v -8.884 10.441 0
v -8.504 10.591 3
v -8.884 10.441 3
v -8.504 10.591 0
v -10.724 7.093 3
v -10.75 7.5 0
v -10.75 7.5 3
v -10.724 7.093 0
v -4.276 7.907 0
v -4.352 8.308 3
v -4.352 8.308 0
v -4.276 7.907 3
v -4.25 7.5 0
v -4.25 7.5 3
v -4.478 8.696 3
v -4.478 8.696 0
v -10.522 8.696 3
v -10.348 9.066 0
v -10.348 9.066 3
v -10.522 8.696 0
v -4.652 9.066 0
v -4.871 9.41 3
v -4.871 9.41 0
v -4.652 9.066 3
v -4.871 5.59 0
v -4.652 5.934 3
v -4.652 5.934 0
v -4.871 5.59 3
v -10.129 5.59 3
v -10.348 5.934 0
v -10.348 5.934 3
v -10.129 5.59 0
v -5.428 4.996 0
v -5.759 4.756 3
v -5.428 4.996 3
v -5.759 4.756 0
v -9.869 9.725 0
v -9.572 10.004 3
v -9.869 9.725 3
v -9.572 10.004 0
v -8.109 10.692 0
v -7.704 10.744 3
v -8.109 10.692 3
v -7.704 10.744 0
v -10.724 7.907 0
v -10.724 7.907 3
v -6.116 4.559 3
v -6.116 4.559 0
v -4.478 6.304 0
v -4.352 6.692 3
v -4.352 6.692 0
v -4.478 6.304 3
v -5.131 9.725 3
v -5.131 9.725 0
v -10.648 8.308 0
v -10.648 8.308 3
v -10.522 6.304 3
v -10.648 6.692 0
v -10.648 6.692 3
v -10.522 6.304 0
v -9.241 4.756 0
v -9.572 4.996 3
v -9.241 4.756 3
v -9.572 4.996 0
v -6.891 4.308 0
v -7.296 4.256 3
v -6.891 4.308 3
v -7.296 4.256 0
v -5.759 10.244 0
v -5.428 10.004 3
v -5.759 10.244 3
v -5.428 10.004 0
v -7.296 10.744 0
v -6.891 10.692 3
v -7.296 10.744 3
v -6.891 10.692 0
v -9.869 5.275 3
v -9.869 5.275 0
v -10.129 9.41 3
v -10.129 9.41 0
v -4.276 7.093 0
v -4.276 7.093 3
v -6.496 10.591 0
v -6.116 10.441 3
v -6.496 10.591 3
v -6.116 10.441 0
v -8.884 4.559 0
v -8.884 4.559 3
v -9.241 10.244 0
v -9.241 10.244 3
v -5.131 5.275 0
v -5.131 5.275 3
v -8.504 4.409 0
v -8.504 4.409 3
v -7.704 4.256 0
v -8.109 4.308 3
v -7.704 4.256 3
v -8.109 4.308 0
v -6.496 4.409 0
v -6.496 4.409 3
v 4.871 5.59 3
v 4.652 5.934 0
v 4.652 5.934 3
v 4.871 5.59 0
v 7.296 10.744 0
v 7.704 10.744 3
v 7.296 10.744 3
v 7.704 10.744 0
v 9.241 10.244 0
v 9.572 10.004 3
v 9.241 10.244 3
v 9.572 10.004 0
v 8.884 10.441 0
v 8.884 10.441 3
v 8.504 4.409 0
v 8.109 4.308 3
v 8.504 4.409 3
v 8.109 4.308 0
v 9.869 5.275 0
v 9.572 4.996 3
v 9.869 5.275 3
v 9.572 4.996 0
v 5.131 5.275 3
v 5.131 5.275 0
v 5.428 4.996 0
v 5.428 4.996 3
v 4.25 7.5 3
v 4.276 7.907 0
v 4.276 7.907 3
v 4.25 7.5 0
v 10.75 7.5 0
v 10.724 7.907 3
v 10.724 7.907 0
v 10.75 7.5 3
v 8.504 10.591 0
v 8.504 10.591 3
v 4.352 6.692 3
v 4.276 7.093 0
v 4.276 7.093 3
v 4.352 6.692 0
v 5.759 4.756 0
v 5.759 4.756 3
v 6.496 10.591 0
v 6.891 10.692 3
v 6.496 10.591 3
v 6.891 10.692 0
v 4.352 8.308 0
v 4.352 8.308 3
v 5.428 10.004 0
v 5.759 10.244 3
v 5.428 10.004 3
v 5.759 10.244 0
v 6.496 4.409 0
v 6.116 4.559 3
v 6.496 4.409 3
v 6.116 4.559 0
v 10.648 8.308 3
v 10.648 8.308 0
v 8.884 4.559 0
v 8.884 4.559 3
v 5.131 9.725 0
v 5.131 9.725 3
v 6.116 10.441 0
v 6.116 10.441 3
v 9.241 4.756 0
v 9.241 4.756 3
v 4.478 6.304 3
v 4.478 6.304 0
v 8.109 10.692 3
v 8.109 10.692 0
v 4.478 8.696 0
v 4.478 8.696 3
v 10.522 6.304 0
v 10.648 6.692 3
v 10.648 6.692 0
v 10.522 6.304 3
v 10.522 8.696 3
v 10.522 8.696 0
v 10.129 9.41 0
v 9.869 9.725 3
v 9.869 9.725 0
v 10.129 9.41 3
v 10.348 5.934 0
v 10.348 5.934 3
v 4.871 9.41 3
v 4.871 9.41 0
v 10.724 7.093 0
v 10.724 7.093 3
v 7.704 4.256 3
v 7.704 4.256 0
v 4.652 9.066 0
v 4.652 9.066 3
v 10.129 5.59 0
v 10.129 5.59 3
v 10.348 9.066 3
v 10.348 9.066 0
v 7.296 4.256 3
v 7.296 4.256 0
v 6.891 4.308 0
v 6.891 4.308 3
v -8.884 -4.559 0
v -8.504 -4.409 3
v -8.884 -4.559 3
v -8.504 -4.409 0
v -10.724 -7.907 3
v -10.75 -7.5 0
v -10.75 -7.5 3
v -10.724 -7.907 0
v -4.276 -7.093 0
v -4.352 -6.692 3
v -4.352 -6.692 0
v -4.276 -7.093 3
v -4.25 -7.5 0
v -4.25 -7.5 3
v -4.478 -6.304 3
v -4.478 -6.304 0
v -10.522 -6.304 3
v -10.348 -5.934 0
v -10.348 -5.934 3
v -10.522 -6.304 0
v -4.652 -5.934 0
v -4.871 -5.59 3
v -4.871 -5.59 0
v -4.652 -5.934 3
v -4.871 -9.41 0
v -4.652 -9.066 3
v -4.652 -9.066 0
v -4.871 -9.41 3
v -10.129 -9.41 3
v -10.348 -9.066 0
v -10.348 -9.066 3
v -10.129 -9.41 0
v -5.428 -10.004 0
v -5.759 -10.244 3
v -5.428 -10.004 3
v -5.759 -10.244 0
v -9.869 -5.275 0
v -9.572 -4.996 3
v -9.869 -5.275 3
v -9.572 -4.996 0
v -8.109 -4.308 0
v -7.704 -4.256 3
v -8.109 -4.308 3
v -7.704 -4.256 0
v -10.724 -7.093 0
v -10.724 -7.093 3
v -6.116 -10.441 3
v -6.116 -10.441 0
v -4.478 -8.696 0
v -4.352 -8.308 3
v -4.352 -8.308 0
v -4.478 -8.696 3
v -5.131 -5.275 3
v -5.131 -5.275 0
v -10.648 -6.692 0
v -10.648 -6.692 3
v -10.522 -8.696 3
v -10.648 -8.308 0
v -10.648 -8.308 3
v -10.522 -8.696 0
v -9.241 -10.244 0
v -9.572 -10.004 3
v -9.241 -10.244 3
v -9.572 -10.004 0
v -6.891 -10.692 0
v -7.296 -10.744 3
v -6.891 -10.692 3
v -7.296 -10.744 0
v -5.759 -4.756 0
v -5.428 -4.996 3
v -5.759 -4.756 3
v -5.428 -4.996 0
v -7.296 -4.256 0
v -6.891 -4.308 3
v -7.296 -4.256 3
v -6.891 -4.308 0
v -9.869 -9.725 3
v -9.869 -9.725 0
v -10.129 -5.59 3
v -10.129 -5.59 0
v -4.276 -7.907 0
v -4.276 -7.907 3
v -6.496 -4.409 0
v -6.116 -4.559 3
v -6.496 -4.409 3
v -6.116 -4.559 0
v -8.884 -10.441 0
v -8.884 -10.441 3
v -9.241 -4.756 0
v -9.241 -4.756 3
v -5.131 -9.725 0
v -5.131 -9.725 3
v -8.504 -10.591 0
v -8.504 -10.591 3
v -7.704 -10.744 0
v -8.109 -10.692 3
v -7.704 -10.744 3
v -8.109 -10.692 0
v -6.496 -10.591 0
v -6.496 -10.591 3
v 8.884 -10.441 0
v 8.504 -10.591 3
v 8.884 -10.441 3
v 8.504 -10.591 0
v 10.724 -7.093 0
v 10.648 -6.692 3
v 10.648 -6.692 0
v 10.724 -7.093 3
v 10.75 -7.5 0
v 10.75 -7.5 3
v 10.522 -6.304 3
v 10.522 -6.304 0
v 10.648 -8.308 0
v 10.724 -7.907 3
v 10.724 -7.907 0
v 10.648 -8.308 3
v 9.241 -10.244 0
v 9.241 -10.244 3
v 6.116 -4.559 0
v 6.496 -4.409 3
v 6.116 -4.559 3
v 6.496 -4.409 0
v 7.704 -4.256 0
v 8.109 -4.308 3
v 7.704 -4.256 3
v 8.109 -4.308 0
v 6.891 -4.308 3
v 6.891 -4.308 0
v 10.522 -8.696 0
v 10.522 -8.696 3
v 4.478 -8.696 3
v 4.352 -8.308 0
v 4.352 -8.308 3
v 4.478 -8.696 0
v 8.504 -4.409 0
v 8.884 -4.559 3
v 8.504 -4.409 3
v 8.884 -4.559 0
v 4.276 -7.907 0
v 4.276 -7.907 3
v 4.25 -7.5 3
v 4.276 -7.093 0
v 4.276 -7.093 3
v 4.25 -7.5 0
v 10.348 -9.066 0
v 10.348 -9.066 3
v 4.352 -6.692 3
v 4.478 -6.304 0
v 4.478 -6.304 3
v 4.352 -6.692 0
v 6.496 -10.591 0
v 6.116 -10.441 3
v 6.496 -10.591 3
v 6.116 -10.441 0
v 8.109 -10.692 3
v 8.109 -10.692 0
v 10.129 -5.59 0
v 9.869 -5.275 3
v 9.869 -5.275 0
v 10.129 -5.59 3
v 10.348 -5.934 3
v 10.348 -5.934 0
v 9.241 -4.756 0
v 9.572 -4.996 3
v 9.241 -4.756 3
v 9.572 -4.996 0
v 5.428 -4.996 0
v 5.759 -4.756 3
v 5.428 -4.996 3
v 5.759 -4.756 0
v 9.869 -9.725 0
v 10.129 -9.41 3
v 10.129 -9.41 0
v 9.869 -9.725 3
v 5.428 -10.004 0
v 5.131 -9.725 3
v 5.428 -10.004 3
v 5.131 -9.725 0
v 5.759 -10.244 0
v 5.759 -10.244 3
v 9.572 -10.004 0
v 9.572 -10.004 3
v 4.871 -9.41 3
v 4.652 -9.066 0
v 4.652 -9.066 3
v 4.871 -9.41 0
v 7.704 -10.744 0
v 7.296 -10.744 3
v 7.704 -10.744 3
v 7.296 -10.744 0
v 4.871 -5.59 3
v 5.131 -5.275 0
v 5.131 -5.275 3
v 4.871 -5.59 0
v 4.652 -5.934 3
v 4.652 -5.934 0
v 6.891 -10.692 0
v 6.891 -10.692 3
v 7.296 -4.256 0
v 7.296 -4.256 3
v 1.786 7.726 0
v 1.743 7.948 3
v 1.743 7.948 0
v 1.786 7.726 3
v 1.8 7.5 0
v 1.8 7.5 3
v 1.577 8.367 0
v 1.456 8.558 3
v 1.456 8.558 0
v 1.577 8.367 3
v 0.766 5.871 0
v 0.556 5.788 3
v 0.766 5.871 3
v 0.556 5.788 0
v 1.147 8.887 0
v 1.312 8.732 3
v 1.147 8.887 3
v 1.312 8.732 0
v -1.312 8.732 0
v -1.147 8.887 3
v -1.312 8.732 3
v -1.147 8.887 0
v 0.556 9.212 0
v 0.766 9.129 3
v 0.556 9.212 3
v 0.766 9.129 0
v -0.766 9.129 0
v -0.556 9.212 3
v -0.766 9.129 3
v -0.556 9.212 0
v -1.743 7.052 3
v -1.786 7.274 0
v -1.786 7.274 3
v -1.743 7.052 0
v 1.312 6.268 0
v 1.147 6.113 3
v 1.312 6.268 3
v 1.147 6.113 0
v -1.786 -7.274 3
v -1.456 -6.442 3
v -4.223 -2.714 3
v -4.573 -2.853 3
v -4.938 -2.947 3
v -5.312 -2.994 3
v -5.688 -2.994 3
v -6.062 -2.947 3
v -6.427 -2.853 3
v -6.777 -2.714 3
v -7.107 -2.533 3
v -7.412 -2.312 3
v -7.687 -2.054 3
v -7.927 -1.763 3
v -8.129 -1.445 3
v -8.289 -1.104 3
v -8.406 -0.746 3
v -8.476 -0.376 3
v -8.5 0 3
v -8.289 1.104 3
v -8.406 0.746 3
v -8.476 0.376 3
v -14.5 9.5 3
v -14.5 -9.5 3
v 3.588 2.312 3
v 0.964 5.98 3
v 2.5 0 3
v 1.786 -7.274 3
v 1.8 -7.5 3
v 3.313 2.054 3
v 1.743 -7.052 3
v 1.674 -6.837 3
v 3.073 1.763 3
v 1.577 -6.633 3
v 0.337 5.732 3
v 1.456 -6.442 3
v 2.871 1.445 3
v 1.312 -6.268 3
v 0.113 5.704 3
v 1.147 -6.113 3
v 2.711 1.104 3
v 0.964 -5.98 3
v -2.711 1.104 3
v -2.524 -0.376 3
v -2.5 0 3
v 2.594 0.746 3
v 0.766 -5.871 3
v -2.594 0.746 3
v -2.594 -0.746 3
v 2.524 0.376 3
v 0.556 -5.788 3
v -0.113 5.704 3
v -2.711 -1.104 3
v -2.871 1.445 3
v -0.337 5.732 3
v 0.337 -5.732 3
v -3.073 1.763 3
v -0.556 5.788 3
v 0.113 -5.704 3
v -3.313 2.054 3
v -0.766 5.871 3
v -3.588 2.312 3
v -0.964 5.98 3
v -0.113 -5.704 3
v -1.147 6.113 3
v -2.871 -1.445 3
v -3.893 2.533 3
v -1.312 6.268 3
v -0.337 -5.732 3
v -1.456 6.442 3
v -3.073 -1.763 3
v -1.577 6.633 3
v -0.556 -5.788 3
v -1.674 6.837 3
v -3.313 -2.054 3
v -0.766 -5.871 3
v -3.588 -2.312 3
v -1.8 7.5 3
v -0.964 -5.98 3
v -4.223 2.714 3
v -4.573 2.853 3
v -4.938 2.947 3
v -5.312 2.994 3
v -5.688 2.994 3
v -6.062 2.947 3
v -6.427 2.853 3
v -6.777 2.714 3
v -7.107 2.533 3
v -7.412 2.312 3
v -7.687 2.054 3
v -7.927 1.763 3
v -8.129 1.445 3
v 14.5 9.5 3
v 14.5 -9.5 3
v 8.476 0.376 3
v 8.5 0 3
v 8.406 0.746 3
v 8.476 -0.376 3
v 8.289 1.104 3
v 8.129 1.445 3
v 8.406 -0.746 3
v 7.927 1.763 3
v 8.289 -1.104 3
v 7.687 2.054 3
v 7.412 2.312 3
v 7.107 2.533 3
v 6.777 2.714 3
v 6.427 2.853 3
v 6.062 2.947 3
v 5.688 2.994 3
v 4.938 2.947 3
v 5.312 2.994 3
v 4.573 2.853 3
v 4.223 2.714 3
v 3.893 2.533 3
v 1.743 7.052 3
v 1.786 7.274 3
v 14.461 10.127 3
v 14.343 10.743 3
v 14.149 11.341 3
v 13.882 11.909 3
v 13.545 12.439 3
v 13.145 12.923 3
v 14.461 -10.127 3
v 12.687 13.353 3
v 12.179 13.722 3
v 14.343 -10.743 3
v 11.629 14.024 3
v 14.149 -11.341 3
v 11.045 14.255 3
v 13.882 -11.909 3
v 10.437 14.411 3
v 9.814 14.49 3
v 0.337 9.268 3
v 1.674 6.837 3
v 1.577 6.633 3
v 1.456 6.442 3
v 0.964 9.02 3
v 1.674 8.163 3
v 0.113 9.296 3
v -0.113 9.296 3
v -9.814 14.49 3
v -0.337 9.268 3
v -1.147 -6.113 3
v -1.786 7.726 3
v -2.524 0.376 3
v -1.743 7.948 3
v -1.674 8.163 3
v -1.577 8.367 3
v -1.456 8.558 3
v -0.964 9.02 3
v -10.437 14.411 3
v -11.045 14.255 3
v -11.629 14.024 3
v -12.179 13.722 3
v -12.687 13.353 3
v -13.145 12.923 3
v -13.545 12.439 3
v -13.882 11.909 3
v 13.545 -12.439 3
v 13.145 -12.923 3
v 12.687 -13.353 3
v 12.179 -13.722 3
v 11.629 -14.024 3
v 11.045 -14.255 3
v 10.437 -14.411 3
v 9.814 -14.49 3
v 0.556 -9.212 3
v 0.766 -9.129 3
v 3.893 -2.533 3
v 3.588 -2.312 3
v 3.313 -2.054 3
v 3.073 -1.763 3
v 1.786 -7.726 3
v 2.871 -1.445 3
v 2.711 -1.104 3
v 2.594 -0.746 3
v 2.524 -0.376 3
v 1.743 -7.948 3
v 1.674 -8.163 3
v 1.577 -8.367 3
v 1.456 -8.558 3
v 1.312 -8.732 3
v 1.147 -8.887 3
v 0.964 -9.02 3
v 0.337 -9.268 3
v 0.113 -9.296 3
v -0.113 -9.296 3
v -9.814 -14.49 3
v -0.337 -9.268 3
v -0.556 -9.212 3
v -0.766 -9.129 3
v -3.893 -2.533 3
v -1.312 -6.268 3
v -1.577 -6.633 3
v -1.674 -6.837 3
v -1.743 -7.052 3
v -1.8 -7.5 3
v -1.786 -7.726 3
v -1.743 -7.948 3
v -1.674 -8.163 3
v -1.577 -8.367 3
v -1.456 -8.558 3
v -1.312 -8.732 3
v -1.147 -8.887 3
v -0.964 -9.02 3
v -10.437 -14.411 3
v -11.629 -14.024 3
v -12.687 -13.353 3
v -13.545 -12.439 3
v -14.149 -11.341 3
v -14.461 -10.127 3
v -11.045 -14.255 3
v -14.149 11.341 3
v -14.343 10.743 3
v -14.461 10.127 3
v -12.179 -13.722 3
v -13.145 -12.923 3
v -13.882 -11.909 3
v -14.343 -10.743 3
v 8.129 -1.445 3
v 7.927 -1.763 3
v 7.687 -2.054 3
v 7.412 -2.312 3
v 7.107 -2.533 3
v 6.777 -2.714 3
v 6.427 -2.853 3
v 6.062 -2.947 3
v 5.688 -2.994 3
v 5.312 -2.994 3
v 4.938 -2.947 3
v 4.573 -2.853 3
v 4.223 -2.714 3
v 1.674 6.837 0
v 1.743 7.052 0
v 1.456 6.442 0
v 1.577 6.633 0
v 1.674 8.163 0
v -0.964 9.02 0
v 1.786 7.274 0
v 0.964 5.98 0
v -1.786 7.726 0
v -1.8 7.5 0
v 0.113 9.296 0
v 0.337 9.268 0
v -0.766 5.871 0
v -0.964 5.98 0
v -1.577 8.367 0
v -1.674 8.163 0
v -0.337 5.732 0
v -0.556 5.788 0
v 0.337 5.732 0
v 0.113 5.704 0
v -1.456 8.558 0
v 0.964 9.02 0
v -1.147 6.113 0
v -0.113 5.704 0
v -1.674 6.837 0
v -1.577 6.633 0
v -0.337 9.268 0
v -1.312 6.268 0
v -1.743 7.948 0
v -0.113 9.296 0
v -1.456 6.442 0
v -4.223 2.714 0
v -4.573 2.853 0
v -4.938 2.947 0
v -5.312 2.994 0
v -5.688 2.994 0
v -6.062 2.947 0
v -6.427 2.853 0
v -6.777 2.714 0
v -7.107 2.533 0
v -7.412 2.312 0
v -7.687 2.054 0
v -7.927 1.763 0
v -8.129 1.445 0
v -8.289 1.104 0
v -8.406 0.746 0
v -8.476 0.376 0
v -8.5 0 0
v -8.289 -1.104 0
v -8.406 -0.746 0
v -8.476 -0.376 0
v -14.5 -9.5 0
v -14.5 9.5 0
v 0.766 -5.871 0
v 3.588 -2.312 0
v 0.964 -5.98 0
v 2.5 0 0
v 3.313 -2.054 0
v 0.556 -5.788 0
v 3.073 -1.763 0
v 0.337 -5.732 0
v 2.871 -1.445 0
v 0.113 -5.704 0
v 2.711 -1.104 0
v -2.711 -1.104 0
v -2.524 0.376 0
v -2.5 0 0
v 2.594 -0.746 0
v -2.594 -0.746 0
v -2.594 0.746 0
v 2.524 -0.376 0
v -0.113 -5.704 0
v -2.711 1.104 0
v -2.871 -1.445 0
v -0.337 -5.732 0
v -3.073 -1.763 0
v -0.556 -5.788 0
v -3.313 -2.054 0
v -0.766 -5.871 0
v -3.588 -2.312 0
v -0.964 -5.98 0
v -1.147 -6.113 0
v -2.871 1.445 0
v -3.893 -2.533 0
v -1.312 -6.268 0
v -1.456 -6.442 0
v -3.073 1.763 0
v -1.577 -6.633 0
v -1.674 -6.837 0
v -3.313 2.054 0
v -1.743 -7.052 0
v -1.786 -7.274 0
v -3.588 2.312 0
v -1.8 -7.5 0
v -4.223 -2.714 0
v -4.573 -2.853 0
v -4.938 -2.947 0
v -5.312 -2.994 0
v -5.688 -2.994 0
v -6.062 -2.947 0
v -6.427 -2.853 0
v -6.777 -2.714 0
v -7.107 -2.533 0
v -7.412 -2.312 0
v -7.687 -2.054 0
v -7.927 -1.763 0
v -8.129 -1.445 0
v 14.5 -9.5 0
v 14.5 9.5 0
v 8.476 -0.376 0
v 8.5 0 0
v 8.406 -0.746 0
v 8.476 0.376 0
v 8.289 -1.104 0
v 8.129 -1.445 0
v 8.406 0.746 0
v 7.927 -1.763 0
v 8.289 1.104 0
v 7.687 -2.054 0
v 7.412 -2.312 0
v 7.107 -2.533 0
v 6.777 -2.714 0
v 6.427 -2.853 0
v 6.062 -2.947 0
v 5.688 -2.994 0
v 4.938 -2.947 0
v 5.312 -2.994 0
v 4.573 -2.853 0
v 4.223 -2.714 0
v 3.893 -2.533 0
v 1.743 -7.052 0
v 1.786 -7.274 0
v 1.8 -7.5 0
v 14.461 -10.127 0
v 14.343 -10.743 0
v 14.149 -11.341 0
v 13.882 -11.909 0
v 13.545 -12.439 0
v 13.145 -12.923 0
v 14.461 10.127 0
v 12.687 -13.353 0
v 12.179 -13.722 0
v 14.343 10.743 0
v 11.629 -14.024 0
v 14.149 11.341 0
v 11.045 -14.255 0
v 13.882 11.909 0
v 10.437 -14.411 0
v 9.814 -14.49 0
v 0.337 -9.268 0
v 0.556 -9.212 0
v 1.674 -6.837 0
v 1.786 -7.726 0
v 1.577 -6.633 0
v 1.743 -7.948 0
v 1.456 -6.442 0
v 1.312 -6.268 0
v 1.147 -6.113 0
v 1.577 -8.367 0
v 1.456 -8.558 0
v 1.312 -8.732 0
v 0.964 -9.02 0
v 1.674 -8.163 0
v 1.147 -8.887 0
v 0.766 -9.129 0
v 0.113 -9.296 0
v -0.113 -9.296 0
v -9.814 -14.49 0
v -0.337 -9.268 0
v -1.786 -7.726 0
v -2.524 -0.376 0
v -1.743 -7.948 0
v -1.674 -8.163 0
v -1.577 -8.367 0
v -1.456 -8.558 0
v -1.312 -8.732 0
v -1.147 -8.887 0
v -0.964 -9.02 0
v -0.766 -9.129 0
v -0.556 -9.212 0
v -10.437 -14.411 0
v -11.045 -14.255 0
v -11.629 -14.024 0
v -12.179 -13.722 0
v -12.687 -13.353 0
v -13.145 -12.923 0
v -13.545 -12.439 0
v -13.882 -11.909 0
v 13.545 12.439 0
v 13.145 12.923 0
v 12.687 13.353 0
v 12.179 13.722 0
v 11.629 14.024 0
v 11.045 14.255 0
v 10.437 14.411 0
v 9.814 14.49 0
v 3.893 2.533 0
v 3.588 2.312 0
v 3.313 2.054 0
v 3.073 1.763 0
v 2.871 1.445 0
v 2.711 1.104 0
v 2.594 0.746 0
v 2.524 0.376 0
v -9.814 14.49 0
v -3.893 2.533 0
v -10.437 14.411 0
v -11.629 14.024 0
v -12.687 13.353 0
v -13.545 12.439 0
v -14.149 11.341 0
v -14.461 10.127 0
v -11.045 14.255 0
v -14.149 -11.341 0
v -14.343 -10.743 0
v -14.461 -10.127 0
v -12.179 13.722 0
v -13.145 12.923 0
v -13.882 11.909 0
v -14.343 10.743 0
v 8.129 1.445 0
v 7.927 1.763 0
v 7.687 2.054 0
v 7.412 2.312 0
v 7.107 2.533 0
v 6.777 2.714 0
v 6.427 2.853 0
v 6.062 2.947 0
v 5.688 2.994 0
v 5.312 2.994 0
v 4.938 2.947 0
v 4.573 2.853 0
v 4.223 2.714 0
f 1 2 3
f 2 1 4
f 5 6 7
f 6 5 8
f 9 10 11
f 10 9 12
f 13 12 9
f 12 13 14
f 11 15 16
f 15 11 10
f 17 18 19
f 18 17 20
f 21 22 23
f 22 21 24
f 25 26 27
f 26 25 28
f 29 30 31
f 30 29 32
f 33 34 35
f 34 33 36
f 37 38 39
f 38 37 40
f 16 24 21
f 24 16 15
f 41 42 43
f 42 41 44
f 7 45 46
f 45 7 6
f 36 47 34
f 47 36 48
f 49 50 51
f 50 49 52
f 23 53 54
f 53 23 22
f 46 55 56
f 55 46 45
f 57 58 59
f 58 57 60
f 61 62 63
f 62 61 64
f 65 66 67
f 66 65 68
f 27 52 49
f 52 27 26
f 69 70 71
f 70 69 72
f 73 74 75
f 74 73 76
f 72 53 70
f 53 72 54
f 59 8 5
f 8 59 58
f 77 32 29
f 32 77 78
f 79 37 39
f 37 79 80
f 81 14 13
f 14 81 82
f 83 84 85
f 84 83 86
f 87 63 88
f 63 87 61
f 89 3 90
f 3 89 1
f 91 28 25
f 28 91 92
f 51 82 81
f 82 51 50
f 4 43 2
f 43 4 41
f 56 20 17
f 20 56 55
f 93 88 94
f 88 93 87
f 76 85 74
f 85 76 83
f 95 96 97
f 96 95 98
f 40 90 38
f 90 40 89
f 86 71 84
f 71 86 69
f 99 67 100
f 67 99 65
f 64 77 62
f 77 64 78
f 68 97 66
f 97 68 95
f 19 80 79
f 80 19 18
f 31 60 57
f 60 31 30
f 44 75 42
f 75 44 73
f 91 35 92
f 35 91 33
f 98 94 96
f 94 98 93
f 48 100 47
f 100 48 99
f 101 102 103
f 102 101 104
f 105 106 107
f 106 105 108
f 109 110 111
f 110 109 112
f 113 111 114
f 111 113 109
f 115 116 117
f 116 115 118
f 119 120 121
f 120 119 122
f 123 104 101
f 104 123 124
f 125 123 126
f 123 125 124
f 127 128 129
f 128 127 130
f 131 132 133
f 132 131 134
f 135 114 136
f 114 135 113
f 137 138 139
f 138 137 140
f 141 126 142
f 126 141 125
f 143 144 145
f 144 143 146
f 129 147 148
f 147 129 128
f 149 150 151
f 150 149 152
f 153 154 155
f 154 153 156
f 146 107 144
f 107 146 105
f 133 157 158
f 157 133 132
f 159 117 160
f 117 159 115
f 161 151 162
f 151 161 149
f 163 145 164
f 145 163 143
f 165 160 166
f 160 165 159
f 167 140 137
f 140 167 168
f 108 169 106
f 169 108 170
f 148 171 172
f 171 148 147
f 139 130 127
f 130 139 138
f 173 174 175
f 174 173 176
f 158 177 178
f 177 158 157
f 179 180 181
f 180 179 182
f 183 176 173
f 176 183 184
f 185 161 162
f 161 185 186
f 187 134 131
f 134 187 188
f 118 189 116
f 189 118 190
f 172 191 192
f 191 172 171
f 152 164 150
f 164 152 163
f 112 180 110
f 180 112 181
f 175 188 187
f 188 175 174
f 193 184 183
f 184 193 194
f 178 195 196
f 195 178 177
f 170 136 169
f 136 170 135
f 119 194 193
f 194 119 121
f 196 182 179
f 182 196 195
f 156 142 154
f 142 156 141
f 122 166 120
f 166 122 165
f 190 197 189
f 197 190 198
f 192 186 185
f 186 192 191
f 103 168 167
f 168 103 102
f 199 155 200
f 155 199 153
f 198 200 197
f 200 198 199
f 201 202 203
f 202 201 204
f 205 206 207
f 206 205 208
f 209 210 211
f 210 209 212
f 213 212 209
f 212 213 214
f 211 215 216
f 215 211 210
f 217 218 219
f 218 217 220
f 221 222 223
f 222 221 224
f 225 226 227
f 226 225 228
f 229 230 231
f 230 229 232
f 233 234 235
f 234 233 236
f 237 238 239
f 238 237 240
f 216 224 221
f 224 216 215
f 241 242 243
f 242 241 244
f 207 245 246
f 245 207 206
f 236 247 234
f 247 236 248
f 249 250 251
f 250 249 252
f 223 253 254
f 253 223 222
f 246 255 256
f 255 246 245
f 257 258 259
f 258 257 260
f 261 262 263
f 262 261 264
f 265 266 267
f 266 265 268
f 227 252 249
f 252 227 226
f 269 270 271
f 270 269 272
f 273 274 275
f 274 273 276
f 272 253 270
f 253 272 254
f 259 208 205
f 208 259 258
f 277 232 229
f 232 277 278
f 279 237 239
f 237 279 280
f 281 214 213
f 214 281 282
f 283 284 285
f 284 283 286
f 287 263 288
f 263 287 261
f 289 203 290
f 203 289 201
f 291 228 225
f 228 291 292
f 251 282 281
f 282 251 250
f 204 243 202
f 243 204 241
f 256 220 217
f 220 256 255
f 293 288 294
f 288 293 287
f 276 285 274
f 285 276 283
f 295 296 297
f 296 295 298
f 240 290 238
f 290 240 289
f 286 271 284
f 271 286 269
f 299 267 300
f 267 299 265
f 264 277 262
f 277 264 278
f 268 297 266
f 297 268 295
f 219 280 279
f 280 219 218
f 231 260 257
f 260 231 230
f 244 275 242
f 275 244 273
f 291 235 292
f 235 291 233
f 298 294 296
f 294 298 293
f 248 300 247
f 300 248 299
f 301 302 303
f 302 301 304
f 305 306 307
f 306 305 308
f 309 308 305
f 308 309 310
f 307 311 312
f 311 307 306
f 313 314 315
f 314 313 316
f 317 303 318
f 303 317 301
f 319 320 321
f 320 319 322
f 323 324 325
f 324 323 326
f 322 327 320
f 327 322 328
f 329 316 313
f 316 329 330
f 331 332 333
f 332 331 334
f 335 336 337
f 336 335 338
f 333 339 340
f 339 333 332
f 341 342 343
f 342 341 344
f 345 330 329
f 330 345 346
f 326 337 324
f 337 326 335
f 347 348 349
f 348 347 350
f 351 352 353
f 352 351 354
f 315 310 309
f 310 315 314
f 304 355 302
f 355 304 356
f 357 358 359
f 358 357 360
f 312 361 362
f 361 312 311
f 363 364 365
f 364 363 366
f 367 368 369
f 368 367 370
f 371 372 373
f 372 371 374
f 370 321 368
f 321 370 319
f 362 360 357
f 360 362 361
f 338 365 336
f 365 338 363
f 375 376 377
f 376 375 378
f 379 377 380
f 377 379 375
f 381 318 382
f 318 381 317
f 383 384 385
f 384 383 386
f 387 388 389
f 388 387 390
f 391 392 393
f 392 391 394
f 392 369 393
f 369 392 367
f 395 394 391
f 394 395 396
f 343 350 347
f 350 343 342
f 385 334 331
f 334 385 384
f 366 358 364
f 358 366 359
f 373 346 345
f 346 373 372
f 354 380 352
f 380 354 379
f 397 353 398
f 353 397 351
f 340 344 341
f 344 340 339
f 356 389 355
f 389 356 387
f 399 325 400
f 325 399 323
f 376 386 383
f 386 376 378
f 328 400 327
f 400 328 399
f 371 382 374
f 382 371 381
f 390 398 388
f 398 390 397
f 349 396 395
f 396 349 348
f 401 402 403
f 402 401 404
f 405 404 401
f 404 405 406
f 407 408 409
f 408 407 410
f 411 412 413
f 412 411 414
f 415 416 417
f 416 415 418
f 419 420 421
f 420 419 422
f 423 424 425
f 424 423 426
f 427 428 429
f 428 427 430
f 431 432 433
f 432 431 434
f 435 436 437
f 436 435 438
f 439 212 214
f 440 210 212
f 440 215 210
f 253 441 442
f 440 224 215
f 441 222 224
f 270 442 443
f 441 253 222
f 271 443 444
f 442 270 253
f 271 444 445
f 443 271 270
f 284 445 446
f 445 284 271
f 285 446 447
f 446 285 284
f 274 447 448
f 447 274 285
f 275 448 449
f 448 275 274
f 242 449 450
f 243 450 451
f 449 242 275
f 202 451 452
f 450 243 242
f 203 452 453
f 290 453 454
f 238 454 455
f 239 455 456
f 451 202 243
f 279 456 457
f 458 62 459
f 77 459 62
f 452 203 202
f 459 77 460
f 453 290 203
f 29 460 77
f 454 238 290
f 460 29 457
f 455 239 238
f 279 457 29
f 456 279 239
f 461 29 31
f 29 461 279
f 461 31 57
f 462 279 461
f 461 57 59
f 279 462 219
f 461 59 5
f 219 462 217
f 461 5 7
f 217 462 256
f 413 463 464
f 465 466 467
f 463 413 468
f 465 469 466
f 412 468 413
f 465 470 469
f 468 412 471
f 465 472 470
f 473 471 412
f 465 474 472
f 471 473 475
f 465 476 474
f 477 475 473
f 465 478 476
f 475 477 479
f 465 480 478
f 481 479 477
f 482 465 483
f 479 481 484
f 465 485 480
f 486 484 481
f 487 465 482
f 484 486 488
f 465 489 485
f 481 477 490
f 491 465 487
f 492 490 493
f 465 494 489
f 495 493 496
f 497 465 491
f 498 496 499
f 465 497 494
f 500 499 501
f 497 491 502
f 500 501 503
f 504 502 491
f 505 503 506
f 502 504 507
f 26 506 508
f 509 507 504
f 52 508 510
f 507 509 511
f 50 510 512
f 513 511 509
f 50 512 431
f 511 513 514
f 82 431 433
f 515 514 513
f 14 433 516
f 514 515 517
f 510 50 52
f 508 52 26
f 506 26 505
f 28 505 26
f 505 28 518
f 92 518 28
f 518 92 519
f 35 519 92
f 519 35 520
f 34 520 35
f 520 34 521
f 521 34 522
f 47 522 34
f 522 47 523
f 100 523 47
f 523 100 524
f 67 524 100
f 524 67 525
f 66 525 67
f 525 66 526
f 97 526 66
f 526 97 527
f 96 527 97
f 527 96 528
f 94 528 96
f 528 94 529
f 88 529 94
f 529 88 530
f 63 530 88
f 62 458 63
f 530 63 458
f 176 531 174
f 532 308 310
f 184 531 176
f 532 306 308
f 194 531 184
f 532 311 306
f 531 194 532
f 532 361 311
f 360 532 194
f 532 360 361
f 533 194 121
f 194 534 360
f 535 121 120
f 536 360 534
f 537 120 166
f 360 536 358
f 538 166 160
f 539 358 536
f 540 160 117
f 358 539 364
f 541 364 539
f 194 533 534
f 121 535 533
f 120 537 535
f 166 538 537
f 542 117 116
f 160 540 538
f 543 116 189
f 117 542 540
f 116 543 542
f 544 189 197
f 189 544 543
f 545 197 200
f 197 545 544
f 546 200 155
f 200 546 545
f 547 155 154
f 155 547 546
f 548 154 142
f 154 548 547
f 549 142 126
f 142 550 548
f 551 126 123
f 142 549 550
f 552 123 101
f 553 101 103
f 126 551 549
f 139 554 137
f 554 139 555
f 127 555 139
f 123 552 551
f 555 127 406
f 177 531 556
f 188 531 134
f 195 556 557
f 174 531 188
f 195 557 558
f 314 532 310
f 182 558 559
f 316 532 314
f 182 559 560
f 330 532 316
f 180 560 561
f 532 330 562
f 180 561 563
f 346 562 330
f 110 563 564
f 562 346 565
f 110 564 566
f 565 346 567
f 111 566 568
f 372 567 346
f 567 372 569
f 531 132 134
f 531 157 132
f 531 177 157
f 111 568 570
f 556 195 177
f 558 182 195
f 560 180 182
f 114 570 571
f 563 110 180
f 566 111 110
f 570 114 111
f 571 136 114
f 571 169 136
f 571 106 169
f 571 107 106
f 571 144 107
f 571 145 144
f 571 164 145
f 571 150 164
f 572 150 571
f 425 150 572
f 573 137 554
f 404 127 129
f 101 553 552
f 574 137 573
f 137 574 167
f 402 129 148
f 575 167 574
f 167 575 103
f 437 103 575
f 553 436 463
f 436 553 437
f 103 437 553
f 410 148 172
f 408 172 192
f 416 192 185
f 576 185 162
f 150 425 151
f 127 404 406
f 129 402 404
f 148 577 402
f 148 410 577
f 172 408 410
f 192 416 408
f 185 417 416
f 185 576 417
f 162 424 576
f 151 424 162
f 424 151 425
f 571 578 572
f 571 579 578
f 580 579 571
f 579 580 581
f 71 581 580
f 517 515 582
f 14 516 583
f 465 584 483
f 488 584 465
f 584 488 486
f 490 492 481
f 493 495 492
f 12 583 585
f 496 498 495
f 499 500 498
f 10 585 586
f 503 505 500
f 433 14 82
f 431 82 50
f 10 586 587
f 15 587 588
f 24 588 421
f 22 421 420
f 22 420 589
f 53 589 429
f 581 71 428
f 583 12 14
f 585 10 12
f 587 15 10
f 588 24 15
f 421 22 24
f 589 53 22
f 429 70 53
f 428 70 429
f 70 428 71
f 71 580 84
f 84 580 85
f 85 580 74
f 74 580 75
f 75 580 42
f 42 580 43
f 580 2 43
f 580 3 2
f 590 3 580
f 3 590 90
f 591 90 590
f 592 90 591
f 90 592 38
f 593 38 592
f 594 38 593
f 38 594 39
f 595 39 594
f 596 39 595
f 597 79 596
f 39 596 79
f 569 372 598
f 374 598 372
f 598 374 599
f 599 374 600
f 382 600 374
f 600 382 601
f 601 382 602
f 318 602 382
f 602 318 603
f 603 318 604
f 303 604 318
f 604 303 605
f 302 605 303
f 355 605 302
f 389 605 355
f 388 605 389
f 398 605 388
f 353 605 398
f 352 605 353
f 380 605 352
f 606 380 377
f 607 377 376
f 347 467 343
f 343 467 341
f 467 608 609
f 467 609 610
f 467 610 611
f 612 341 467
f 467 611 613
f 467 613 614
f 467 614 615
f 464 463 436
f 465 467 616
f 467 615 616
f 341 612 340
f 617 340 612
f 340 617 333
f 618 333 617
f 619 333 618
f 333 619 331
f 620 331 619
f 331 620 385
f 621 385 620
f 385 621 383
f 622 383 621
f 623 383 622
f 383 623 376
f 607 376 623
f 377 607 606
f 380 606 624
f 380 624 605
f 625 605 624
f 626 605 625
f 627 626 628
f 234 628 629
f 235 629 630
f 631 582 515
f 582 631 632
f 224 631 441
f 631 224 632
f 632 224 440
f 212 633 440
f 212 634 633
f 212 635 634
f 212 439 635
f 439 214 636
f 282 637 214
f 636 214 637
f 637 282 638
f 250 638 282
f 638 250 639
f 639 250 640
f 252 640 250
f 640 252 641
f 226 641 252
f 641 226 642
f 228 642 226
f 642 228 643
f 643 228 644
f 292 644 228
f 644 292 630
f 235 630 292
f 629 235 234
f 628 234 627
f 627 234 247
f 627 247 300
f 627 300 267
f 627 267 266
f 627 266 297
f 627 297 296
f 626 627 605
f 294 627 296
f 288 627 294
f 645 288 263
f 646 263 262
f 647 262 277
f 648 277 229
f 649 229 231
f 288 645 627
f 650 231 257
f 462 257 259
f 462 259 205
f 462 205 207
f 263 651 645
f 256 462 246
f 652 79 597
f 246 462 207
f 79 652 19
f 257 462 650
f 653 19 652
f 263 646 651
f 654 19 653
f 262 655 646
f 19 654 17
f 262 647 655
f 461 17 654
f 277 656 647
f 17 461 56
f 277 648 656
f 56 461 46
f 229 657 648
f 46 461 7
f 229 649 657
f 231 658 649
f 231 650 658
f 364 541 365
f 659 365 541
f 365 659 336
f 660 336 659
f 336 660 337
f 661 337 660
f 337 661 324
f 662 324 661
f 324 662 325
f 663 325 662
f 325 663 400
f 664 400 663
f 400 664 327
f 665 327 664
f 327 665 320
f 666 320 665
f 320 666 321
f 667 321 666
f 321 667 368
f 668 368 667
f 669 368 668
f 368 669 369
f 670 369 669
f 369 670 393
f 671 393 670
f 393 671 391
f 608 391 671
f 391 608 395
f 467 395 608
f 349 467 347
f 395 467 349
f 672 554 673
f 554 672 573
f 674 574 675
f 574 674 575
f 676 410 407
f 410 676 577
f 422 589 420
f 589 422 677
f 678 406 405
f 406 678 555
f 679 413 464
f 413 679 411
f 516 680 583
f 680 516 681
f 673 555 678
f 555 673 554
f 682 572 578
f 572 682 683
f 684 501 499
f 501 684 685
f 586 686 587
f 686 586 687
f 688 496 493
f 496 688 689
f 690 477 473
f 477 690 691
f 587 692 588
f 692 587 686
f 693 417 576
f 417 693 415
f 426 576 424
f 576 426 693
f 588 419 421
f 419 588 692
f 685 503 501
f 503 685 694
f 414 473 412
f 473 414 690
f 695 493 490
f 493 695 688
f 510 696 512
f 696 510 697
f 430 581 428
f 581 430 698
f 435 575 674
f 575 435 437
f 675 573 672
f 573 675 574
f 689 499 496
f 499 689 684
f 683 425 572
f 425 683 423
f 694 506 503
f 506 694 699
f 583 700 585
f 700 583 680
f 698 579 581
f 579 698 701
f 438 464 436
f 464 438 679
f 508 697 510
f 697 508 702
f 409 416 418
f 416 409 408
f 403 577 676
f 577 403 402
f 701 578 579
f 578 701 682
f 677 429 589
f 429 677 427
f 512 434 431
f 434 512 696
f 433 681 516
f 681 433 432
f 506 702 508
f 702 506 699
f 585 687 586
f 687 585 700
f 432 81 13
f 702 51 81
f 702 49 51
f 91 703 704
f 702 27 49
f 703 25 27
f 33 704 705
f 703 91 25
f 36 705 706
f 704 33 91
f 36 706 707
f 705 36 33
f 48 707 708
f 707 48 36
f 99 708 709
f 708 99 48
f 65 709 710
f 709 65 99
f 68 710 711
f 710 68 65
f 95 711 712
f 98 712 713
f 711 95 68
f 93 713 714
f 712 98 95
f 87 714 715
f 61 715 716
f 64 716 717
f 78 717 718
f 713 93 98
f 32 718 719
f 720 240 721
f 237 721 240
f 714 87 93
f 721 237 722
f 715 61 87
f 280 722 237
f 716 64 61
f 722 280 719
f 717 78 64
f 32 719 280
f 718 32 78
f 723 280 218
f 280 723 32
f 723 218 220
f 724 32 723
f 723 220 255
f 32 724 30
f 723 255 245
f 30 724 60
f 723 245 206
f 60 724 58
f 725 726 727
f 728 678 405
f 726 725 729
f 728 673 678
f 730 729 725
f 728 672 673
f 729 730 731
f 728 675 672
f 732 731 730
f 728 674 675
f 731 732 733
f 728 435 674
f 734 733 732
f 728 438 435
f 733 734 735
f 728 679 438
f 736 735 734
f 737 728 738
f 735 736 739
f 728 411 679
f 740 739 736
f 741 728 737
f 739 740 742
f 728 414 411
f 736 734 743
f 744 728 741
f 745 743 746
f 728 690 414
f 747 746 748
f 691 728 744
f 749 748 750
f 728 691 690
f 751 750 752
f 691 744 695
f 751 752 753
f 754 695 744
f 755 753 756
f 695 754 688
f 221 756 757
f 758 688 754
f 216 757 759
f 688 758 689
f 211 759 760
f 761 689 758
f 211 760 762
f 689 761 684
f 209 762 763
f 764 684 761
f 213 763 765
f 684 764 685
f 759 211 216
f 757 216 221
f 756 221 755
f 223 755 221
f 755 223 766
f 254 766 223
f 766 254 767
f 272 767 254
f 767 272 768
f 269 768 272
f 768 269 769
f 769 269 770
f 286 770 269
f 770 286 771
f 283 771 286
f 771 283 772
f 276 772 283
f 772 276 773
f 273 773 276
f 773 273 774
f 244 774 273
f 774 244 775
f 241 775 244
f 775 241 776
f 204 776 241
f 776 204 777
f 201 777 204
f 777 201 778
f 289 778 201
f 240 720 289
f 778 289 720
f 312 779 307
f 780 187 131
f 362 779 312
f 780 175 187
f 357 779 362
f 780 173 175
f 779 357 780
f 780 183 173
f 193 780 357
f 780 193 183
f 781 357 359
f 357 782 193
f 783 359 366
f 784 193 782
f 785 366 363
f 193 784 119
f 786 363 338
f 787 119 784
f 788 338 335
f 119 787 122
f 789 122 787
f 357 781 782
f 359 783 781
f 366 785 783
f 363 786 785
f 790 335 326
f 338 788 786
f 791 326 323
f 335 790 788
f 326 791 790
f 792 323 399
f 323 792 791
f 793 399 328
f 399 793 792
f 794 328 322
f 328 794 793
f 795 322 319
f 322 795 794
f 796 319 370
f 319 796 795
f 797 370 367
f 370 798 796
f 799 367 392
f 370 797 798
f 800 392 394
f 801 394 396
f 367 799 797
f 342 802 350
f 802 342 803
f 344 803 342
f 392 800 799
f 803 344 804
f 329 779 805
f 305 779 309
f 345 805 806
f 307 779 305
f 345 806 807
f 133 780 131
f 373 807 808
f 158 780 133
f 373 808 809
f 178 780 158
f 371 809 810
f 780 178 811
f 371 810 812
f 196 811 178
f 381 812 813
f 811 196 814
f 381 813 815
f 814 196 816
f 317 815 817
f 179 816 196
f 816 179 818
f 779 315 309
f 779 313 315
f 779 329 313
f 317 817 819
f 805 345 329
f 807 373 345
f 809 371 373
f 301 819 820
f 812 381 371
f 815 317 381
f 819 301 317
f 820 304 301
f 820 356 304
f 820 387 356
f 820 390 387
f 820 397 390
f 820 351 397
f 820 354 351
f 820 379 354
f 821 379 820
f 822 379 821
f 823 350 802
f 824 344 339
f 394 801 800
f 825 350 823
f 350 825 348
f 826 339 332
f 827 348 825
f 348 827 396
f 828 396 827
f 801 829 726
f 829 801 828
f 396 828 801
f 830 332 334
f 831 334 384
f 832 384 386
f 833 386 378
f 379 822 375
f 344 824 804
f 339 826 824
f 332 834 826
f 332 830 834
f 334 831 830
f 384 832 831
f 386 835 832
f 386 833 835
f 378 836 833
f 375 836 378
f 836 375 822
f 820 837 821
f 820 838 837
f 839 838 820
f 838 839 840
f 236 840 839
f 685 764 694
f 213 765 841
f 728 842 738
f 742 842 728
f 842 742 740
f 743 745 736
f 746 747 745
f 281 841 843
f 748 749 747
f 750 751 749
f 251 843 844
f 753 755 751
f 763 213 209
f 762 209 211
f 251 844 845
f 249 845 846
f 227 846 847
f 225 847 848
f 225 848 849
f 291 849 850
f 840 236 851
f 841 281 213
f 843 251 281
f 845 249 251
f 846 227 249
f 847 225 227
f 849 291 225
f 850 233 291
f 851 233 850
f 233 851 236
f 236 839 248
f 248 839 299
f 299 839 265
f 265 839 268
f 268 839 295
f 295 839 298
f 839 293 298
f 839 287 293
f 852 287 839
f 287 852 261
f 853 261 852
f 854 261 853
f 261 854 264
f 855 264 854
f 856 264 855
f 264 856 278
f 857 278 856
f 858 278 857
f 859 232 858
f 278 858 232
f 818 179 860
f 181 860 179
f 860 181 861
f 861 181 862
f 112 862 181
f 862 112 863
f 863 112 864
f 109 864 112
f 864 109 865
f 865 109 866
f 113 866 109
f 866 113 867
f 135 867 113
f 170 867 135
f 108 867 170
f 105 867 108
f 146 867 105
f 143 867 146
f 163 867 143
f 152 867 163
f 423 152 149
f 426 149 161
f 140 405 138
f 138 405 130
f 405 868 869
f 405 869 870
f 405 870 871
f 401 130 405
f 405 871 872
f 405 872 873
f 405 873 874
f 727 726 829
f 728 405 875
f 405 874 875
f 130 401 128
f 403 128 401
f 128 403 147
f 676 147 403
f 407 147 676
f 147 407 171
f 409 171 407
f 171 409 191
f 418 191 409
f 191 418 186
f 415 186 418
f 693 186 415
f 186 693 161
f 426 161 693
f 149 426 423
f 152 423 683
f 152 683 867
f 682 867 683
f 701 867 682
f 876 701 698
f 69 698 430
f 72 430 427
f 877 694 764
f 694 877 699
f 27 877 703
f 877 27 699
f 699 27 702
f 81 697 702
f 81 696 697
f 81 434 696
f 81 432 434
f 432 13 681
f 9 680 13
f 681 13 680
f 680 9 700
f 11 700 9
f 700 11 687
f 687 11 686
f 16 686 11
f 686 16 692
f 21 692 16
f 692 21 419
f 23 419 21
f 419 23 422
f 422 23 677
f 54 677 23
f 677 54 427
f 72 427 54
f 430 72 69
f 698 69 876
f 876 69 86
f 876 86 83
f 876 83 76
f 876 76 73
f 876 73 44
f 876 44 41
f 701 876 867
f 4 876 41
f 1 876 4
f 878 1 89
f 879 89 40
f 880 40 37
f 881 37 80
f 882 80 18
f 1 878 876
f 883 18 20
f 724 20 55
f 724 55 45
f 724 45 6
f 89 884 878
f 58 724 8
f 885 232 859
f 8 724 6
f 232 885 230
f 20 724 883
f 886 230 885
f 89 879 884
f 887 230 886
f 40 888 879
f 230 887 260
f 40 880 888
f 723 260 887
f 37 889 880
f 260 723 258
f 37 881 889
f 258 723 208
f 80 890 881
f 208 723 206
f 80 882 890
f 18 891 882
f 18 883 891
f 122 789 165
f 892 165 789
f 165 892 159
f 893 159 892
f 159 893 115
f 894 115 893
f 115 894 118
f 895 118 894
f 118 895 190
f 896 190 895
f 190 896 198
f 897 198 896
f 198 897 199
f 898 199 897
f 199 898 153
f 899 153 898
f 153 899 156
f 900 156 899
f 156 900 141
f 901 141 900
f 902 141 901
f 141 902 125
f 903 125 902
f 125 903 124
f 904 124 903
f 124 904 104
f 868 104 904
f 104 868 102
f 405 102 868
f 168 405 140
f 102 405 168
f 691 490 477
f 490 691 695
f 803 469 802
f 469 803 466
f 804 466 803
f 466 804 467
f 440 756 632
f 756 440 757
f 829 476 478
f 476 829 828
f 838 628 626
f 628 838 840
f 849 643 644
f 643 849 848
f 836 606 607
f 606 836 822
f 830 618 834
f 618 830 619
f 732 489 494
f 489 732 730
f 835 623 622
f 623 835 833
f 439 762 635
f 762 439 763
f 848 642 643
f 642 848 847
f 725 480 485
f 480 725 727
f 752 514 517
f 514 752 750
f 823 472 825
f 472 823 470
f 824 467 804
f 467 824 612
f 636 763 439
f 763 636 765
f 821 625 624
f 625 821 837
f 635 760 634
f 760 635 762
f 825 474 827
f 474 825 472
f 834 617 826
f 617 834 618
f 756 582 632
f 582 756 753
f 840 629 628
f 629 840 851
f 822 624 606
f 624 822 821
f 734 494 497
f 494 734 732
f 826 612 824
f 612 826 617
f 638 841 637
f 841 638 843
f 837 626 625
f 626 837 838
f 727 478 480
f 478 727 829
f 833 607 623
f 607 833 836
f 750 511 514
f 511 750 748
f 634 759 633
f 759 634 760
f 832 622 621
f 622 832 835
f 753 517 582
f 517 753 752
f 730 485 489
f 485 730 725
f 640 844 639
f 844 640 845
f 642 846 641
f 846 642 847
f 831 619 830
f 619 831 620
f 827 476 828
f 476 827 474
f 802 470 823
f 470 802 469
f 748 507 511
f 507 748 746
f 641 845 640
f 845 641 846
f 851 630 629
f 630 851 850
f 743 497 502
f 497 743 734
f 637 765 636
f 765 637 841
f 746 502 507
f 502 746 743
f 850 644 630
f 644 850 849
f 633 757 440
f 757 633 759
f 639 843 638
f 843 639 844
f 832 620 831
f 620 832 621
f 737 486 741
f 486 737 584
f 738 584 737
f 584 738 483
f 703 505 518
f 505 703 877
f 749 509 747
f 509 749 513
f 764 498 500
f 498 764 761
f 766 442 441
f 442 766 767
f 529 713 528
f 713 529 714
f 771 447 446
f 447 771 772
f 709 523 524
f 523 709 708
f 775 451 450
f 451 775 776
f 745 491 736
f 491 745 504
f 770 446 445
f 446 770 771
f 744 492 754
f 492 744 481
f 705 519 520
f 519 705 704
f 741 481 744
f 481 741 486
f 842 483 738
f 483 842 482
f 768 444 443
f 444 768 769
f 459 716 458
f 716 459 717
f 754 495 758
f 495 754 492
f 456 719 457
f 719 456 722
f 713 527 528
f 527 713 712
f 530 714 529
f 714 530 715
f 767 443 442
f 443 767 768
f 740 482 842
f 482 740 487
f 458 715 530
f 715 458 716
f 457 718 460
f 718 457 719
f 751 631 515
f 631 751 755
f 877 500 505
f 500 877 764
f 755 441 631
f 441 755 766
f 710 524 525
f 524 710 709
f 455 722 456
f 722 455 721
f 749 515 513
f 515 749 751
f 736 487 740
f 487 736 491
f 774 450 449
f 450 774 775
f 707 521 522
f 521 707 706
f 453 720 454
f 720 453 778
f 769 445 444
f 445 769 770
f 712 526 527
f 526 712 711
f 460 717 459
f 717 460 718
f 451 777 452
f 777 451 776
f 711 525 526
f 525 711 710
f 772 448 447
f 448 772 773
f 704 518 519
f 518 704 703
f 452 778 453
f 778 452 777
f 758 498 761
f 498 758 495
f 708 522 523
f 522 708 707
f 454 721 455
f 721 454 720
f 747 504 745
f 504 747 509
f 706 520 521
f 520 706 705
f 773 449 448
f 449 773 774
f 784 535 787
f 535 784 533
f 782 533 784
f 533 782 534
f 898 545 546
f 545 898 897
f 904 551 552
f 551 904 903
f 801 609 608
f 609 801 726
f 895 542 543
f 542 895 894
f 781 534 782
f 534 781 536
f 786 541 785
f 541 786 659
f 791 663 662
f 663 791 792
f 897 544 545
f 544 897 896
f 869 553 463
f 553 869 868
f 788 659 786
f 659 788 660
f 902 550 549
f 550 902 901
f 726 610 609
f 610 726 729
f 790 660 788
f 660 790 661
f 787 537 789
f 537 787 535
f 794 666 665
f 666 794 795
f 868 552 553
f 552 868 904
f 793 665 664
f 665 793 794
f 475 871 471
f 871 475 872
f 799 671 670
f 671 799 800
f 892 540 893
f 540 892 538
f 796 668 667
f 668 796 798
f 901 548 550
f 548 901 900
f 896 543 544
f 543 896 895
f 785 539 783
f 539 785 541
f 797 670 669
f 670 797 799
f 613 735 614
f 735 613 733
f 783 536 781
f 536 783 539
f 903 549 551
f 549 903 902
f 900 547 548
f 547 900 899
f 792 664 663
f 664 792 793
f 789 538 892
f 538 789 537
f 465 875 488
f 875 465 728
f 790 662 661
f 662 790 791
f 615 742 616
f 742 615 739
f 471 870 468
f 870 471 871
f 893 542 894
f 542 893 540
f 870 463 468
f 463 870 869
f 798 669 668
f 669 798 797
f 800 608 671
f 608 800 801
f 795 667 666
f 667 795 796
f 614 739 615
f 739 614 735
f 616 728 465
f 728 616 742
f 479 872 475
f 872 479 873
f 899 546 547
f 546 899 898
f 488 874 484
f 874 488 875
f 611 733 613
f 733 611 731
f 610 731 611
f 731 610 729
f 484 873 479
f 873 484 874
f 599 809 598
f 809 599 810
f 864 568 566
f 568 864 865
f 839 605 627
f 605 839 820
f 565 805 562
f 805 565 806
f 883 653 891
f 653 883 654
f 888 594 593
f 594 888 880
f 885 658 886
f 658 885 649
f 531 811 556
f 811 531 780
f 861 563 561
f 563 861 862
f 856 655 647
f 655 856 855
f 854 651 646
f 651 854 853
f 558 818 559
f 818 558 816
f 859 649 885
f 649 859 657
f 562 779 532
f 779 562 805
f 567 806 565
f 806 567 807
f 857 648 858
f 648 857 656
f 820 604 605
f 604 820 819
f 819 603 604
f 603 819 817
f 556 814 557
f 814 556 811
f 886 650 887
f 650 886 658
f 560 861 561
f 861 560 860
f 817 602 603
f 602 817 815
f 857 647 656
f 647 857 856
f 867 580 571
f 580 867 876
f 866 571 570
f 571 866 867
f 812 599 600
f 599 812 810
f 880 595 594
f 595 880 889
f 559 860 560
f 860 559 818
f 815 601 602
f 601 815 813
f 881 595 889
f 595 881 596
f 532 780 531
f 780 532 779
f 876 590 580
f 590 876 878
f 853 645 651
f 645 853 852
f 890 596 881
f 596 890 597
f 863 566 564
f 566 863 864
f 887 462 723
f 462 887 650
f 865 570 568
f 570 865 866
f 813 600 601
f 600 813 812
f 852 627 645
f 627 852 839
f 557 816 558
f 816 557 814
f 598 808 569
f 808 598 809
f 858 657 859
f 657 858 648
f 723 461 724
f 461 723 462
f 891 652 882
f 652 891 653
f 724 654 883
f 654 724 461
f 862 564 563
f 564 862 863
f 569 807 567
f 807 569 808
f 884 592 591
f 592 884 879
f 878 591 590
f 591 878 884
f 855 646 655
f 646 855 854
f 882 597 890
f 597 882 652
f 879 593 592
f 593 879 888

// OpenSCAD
$fn = 50;


difference() {
	union() {
		hull() {
			translate(v = [-9.5000000000, 9.5000000000, 0]) {
				cylinder(h = 3, r = 5);
			}
			translate(v = [9.5000000000, 9.5000000000, 0]) {
				cylinder(h = 3, r = 5);
			}
			translate(v = [-9.5000000000, -9.5000000000, 0]) {
				cylinder(h = 3, r = 5);
			}
			translate(v = [9.5000000000, -9.5000000000, 0]) {
				cylinder(h = 3, r = 5);
			}
		}
	}
	union() {
		#translate(v = [-7.5000000000, 7.5000000000, 0]) {
			cylinder(h = 3, r = 3.2500000000);
		}
		#translate(v = [7.5000000000, 7.5000000000, 0]) {
			cylinder(h = 3, r = 3.2500000000);
		}
		#translate(v = [-7.5000000000, -7.5000000000, 0]) {
			cylinder(h = 3, r = 3.2500000000);
		}
		#translate(v = [7.5000000000, -7.5000000000, 0]) {
			cylinder(h = 3, r = 3.2500000000);
		}
		#translate(v = [-7.5000000000, -7.5000000000, -100.0000000000]) {
			cylinder(h = 200, r = 3.2500000000);
		}
		#translate(v = [-7.5000000000, 7.5000000000, -100.0000000000]) {
			cylinder(h = 200, r = 3.2500000000);
		}
		#translate(v = [7.5000000000, -7.5000000000, -100.0000000000]) {
			cylinder(h = 200, r = 3.2500000000);
		}
		#translate(v = [7.5000000000, 7.5000000000, -100.0000000000]) {
			cylinder(h = 200, r = 3.2500000000);
		}
		#translate(v = [-7.5000000000, 7.5000000000, 0]) {
			cylinder(h = 3, r = 1.8000000000);
		}
		#translate(v = [0.0000000000, 7.5000000000, 0]) {
			cylinder(h = 3, r = 1.8000000000);
		}
		#translate(v = [7.5000000000, 7.5000000000, 0]) {
			cylinder(h = 3, r = 1.8000000000);
		}
		#translate(v = [-7.5000000000, -7.5000000000, 0]) {
			cylinder(h = 3, r = 1.8000000000);
		}
		#translate(v = [0.0000000000, -7.5000000000, 0]) {
			cylinder(h = 3, r = 1.8000000000);
		}
		#translate(v = [7.5000000000, -7.5000000000, 0]) {
			cylinder(h = 3, r = 1.8000000000);
		}
		#translate(v = [-7.5000000000, 7.5000000000, 0]) {
			cylinder(h = 3, r = 1.8000000000);
		}
		#translate(v = [0.0000000000, 7.5000000000, 0]) {
			cylinder(h = 3, r = 1.8000000000);
		}
		#translate(v = [7.5000000000, 7.5000000000, 0]) {
			cylinder(h = 3, r = 1.8000000000);
		}
		#translate(v = [-7.5000000000, -7.5000000000, 0]) {
			cylinder(h = 3, r = 1.8000000000);
		}
		#translate(v = [0.0000000000, -7.5000000000, 0]) {
			cylinder(h = 3, r = 1.8000000000);
		}
		#translate(v = [7.5000000000, -7.5000000000, 0]) {
			cylinder(h = 3, r = 1.8000000000);
		}
		#translate(v = [-7.5000000000, 7.5000000000, 0]) {
			cylinder(h = 3, r = 1.8000000000);
		}
		#translate(v = [0.0000000000, 7.5000000000, 0]) {
			cylinder(h = 3, r = 1.8000000000);
		}
		#translate(v = [7.5000000000, 7.5000000000, 0]) {
			cylinder(h = 3, r = 1.8000000000);
		}
		#translate(v = [-7.5000000000, -7.5000000000, 0]) {
			cylinder(h = 3, r = 1.8000000000);
		}
		#translate(v = [0.0000000000, -7.5000000000, 0]) {
			cylinder(h = 3, r = 1.8000000000);
		}
		#translate(v = [7.5000000000, -7.5000000000, 0]) {
			cylinder(h = 3, r = 1.8000000000);
		}
		#translate(v = [-5.5000000000, 0, 0]) {
			cylinder(h = 3, r = 3.0000000000);
		}
		#translate(v = [5.5000000000, 0, 0]) {
			cylinder(h = 3, r = 3.0000000000);
		}
	}
}
